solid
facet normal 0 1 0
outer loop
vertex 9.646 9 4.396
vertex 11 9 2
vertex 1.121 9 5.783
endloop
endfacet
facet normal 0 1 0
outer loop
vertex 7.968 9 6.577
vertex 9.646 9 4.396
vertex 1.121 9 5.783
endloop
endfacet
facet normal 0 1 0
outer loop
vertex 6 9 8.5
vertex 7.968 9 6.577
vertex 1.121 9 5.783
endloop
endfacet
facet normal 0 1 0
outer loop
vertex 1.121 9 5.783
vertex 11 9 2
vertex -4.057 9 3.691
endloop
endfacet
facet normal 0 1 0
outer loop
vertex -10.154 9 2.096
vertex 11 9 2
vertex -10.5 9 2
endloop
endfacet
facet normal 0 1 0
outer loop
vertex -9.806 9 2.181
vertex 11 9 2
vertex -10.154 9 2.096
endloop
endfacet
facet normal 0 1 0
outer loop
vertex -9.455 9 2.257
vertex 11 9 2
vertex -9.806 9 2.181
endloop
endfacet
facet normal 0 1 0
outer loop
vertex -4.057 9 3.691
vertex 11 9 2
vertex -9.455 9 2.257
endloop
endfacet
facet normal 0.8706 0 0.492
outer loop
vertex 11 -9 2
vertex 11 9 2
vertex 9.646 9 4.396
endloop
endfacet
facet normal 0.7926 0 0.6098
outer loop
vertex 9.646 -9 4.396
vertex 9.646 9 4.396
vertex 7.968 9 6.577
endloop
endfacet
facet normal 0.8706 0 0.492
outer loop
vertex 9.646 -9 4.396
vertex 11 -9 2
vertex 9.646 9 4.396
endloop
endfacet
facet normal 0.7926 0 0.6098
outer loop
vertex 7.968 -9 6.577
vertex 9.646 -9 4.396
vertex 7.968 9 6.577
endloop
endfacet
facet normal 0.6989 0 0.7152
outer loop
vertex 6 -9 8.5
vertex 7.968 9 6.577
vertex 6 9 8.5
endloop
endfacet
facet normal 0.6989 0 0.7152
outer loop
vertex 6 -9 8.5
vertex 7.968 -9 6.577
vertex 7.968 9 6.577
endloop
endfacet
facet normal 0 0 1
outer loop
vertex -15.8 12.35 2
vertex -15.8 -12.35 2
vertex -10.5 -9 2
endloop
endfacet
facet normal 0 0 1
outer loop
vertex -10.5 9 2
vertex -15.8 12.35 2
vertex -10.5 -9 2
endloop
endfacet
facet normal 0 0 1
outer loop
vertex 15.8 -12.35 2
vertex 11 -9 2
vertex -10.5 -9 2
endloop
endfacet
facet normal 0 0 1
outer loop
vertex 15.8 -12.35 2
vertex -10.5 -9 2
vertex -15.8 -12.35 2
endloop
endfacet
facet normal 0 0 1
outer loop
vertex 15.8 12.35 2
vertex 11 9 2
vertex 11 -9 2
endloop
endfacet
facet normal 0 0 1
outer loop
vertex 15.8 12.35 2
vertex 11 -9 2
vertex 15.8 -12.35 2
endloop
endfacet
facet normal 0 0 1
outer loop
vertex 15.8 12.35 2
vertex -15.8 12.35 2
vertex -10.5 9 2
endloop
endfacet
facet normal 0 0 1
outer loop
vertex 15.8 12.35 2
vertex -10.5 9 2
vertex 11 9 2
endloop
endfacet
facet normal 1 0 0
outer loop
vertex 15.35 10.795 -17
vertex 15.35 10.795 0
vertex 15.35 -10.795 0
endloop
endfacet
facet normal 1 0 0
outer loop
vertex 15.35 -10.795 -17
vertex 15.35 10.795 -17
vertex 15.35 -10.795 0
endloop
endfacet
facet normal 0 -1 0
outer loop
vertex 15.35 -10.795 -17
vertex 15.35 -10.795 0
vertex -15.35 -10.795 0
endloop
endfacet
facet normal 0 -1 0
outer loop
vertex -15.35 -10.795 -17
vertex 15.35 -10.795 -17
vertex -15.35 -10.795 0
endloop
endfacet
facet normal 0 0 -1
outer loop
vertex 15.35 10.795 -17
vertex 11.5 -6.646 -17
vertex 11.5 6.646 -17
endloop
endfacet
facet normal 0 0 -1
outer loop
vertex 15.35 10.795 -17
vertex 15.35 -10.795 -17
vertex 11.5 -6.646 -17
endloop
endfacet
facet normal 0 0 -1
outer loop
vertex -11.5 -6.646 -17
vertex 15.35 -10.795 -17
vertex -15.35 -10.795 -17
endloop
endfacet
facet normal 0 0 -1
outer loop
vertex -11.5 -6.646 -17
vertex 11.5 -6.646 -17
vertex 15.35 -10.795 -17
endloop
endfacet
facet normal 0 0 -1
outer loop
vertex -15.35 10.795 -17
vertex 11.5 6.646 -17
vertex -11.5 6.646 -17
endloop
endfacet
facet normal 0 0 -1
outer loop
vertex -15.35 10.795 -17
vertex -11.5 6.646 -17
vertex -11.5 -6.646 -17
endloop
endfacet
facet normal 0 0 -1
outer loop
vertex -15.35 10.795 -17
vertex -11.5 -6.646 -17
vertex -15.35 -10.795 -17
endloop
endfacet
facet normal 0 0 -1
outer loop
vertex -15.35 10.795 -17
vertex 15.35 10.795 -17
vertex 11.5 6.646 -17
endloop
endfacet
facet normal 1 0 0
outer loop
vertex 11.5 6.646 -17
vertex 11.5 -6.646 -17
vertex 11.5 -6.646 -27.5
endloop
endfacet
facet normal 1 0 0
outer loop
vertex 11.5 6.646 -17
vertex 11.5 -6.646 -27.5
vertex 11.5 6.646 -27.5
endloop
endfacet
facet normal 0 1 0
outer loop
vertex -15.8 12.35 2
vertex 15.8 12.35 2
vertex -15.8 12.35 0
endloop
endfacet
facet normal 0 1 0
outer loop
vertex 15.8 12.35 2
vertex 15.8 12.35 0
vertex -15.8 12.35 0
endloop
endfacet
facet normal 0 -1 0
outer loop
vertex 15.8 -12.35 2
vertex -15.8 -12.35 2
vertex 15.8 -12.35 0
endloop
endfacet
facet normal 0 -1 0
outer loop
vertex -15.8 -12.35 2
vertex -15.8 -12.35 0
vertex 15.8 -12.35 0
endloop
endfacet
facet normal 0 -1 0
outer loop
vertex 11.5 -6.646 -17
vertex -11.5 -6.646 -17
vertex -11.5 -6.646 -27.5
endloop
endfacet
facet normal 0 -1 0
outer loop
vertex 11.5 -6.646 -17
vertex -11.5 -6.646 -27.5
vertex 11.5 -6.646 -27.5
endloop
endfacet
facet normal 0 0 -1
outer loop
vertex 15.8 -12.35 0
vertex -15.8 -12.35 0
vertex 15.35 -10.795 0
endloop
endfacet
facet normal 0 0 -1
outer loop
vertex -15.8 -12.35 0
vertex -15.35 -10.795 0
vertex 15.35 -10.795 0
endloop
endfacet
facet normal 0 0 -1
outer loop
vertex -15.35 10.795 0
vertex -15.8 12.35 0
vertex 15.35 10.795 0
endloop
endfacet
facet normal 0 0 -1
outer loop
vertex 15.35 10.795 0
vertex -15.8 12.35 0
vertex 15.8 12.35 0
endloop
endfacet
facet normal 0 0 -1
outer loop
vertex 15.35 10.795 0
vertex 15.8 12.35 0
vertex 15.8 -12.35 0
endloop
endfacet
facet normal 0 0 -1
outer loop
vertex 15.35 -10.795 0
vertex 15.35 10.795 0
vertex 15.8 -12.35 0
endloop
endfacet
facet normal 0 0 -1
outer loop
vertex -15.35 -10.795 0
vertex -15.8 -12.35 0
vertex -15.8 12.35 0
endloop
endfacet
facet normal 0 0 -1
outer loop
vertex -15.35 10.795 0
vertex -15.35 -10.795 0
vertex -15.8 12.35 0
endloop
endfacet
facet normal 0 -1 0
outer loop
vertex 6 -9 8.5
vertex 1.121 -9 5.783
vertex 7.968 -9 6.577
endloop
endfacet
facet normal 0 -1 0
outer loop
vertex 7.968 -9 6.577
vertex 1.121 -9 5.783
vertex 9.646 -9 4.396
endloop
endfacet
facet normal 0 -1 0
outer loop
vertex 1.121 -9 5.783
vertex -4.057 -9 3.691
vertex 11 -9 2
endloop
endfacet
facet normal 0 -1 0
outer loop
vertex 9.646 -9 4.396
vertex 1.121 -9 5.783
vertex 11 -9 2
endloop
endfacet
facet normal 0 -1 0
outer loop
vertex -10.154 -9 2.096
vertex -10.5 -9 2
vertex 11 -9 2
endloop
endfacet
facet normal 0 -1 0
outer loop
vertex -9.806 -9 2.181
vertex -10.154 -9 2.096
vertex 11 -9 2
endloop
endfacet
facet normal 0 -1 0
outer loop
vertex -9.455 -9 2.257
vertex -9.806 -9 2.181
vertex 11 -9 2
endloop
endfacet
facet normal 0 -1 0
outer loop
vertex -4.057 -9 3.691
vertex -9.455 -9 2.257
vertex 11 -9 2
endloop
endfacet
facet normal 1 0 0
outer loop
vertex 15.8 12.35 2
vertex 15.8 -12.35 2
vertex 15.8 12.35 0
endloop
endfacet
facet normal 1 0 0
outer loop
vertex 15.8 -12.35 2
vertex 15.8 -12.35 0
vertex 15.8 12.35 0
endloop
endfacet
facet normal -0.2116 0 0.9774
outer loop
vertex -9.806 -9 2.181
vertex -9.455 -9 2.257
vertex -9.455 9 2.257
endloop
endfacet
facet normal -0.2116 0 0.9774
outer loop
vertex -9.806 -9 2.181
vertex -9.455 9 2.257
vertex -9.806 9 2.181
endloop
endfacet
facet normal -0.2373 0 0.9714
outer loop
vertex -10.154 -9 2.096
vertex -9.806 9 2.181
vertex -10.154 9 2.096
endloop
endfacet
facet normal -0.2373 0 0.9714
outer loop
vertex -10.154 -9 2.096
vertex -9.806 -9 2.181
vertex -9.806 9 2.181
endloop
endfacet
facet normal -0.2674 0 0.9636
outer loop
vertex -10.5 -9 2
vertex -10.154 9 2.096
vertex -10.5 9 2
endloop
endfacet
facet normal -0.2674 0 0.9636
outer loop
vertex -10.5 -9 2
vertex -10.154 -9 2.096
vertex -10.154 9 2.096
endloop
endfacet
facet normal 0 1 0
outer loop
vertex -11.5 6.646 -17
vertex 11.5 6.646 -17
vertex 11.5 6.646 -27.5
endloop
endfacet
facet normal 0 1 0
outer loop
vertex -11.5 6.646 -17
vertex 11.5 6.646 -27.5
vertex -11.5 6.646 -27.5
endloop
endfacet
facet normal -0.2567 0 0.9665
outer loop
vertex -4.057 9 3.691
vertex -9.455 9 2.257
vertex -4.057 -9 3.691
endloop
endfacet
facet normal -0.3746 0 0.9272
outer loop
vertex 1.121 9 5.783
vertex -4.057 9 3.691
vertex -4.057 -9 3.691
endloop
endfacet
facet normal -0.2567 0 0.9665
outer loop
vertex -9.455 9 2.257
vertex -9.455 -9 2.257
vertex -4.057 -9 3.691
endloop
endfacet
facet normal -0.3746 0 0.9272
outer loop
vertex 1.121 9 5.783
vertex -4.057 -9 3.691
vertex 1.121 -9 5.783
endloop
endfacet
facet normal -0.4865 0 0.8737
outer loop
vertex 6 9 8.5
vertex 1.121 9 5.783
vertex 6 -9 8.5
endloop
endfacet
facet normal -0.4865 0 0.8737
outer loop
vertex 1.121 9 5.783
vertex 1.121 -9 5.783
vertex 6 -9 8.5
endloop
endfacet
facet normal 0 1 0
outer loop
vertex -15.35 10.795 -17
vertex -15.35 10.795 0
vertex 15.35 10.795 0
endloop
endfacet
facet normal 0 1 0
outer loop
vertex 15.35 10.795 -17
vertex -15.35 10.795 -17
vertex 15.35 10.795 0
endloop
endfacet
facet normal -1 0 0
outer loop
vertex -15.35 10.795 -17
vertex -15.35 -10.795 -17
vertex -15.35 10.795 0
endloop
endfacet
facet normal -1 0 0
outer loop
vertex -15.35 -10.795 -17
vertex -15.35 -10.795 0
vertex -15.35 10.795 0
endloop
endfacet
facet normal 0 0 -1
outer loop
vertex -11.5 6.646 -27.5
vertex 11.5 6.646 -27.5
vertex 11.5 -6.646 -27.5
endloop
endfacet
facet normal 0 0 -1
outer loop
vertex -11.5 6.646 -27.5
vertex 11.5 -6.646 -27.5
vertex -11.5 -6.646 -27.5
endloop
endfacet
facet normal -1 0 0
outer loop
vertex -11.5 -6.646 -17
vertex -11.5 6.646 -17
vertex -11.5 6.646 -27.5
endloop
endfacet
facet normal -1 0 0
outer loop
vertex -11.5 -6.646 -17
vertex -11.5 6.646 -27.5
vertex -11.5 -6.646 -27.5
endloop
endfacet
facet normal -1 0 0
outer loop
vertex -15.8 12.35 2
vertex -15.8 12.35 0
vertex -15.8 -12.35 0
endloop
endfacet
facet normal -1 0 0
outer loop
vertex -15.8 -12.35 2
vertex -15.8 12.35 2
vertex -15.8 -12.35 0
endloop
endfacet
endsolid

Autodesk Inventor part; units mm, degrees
ref_plane "YZ Plane" through (0, 0, 0) normal (1, 0, 0) x (0, 1, 0)
ref_plane "XZ Plane" through (0, 0, 0) normal (0, 1, 0) x (-1, 0, 0)
ref_plane "XY Plane" through (0, 0, 0) normal (0, 0, 1) x (1, 0, 0)
sketch "Base" plane through (0, 0, 0) normal (0, 0, 1) x (1, 0, 0)
  line L0 (-15.8, -12.35) -> (15.8, -12.35)
  line L1 (15.8, -12.35) -> (15.8, 12.35)
  line L2 (15.8, 12.35) -> (-15.8, 12.35)
  line L3 (-15.8, 12.35) -> (-15.8, -12.35)
  line L4 (-15.8, -12.35) -> (15.8, 12.35) construction
  line L5 (15.8, -12.35) -> (-15.8, 12.35) construction
  point P0 (0, 0)
  dimension "d0" = 31.6
  dimension "d1" = 24.7
extrude "BaseFeature" add sketch "Base" along normal blind 2
sketch "Switch" plane through (0, 0, 2) normal (0, 0, 1) x (1, 0, 0)
  line L0 (-12, -9) -> (12, -9)
  line L1 (12, -9) -> (12, 9)
  line L2 (12, 9) -> (-12, 9)
  line L3 (-12, 9) -> (-12, -9)
  line L4 (-12, -9) -> (12, 9) construction
  line L5 (12, -9) -> (-12, 9) construction
  point P0 (0, 0)
  dimension "d4" = 24
  dimension "d7" = 18
extrude "SwitchFeature" add sketch "Switch" along normal blind 6.5
sketch "SwitchProfile" plane through (-12, -9, 2) normal (0, -1, 0) x (1, 0, 0)
  line L0 (27.8, 0) -> (-3.8, 0) projected
  line L1 (24, 6.5) -> (0, 6.5) projected
  arc A0 (23, 0) -> (18, 6.5) centre (5.3894, -8.3735) ccw
  arc A1 (2.5453, 0.2566) -> (18, 6.5) centre (-6.2914, 44.3804) ccw
  arc A2 (2.5453, 0.2566) -> (1.5, 0) centre (5, -12) ccw
  line L2 (24, 0) -> (24, 6.5) projected
  line L3 (0, 0) -> (0, 6.5) projected
  point P0 (12, -2)
  point P1 (0, 3.25)
  dimension "d8" = 6
  dimension "d10" = 45
  dimension "d11" = 19.5
  dimension "d13" = 12.5
  dimension "d14" = 1
  dimension "d15" = 12
  dimension "d16" = 19
extrude "SwitchProfileFeature" cut sketch "SwitchProfile" against normal through all contours L0 A0 L1 L2 | L0 L3 L1 A1 A2
sketch "Body" plane through (0, 0, 0) normal (0, 0, -1) x (-1, 0, 0)
  line L0 (-15.35, -10.795) -> (15.35, -10.795)
  line L1 (15.35, -10.795) -> (15.35, 10.795)
  line L2 (15.35, 10.795) -> (-15.35, 10.795)
  line L3 (-15.35, 10.795) -> (-15.35, -10.795)
  line L4 (-15.35, -10.795) -> (15.35, 10.795) construction
  line L5 (15.35, -10.795) -> (-15.35, 10.795) construction
  line L6 (15.8, -12.35) -> (-15.8, -12.35) projected
  line L7 (15.8, 12.35) -> (15.8, -12.35) projected
  point P0 (0, 0)
  dimension "d19" = 21.59
  dimension "d20" = 1.555
  dimension "d29" = 30.7
extrude "BodyFeature" add sketch "Body" along normal blind 17
sketch "Pins" plane through (0, 0, -17) normal (0, 0, -1) x (-1, 0, 0)
  line L0 (11.5, -6.6456) -> (-11.5, -6.6456)
  line L1 (-11.5, -6.6456) -> (-11.5, 6.6456)
  line L2 (-11.5, 6.6456) -> (11.5, 6.6456)
  line L3 (11.5, 6.6456) -> (11.5, -6.6456)
  line L4 (11.5, -6.6456) -> (-11.5, 6.6456) construction
  line L5 (-11.5, -6.6456) -> (11.5, 6.6456) construction
  line L6 (-15.35, -10.795) -> (15.35, -10.795) projected
  point P0 (0, 0)
  point P1 (0, -10.795)
  dimension "d25" = 23
extrude "PinsFeature" add sketch "Pins" along normal blind 10.5
properties part number "IlluminatedSwitch12V10A"
